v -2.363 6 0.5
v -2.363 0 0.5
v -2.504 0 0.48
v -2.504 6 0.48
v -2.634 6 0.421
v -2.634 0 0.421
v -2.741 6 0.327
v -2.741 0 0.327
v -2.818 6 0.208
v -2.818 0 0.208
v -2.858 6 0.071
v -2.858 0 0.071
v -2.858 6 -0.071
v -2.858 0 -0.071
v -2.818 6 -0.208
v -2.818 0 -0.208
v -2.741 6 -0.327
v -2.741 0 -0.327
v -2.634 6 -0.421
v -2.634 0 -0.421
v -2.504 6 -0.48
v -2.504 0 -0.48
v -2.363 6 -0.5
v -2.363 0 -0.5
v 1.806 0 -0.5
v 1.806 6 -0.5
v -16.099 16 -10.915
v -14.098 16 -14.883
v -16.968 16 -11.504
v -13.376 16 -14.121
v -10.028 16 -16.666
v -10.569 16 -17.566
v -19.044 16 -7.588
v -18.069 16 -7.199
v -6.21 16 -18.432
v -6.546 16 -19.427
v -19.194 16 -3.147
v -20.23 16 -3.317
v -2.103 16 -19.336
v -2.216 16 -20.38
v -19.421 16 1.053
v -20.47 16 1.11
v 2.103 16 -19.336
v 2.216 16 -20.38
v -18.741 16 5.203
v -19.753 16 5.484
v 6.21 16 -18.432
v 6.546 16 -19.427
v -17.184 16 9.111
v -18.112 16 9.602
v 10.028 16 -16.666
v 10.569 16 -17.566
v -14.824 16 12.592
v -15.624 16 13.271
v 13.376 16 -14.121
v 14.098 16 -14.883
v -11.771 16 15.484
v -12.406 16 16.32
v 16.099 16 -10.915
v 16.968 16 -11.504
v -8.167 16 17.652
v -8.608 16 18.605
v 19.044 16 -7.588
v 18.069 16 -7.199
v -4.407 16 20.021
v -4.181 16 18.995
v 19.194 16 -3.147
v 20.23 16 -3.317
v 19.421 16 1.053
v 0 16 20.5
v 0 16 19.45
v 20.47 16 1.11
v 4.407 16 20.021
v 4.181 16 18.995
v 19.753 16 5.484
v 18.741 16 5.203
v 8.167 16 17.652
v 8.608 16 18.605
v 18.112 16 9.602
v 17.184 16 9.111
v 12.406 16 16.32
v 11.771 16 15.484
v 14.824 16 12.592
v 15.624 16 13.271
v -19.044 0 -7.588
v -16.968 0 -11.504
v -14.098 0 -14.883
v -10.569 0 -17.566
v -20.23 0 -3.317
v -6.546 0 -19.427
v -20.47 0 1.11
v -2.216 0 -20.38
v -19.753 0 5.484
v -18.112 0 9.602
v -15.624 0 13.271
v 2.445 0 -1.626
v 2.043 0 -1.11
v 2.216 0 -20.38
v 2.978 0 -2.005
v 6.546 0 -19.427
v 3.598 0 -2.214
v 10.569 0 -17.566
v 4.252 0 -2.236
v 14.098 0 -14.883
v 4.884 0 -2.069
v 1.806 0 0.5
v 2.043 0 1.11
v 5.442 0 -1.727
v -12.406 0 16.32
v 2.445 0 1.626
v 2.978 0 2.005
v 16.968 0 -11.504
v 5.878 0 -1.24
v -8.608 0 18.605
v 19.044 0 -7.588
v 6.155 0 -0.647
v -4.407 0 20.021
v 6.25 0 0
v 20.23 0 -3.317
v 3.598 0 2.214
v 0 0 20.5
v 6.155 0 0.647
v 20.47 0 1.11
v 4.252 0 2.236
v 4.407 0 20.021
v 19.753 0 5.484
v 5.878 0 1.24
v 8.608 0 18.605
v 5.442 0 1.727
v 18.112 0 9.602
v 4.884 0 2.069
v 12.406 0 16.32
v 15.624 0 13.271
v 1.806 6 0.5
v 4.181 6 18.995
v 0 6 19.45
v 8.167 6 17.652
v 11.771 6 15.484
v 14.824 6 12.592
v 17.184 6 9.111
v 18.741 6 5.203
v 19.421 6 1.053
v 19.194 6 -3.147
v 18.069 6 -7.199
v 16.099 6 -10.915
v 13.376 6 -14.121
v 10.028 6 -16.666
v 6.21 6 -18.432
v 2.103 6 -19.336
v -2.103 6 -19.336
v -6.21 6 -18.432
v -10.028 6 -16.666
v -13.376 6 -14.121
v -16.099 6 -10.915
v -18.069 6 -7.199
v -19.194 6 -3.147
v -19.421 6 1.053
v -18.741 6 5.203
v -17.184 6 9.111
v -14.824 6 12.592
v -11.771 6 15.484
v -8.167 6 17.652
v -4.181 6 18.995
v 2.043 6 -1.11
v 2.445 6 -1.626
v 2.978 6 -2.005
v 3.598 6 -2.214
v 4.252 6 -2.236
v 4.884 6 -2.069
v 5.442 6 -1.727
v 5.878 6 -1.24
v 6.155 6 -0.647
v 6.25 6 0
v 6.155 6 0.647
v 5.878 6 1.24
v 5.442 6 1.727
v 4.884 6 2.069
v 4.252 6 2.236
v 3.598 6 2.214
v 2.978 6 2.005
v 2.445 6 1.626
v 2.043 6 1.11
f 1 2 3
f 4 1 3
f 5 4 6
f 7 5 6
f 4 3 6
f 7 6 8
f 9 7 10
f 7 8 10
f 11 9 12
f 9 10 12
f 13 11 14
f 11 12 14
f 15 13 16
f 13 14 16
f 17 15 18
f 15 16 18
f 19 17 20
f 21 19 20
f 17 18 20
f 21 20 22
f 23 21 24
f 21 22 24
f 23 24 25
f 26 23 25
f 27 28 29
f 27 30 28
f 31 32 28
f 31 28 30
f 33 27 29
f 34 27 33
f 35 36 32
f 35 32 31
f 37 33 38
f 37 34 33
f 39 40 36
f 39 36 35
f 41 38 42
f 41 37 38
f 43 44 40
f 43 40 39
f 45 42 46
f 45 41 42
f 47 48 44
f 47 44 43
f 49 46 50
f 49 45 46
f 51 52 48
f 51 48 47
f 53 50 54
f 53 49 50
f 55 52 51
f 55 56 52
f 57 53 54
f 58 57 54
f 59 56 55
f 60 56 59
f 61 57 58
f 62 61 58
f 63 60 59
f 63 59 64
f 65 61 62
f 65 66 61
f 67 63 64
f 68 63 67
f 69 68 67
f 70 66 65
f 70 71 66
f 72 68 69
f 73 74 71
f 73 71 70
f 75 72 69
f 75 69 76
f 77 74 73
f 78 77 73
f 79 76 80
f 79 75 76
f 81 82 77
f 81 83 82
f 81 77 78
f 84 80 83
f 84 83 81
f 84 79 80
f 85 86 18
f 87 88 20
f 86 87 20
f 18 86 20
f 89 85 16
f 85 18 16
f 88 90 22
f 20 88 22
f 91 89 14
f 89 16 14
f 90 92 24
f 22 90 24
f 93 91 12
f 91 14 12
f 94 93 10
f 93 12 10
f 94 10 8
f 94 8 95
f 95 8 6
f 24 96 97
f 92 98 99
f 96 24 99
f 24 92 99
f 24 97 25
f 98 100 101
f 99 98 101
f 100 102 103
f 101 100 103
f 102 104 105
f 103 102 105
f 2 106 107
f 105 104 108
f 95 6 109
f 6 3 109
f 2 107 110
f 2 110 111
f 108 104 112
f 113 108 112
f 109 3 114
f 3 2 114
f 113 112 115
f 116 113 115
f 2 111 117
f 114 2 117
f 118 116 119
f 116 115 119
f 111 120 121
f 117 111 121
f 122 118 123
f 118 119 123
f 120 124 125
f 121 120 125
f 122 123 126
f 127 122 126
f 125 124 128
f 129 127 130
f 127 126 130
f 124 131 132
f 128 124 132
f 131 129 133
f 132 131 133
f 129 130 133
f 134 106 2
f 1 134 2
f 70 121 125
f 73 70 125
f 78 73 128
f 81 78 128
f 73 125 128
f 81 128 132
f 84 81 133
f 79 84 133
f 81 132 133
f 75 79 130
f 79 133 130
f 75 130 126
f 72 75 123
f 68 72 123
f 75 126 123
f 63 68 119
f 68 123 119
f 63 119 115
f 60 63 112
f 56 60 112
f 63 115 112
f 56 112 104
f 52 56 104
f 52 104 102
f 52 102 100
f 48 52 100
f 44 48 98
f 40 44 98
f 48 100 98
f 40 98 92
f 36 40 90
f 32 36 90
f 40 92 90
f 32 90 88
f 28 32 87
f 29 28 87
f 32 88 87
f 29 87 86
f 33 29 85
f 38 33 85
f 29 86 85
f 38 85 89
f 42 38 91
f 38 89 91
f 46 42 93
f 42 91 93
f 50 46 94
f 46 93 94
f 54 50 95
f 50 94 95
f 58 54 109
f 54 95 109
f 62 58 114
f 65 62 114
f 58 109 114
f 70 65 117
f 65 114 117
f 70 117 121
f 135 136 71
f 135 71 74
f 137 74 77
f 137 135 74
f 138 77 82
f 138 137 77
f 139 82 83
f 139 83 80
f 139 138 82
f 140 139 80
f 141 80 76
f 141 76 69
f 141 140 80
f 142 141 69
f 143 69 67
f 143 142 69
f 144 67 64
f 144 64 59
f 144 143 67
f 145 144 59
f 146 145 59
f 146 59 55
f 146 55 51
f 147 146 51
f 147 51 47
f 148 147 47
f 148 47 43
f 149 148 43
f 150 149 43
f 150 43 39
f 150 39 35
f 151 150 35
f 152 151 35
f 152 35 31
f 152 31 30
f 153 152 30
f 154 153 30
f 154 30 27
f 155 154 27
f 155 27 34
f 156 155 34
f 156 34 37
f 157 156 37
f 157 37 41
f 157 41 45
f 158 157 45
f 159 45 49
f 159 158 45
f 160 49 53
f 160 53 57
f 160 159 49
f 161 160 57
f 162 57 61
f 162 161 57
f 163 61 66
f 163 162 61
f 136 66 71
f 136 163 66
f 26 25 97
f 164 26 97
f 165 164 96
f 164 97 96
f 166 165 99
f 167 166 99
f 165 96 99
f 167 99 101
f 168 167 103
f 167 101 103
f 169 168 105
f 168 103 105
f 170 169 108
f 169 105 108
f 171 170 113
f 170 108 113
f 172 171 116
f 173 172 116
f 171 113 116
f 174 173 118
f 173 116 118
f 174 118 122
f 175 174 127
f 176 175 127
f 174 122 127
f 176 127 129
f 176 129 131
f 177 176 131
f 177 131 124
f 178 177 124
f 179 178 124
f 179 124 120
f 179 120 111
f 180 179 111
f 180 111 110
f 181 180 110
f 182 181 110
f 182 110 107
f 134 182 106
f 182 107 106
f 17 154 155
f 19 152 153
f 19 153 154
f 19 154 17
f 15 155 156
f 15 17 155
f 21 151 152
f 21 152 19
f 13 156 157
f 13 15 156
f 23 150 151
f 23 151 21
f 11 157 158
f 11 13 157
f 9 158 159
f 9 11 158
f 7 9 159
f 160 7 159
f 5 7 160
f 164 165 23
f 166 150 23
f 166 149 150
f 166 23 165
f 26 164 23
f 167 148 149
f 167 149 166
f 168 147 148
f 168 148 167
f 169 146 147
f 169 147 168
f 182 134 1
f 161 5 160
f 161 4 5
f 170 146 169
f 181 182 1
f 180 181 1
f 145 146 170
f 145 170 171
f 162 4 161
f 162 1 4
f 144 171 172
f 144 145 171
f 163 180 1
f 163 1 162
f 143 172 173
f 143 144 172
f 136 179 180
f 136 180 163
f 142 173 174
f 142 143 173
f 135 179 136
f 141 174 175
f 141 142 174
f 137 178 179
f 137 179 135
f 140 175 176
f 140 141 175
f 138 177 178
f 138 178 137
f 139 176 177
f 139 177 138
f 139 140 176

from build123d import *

# Parameters (mm, degrees)
SKETCH1_R                = 19.45
BOSS_EXTRUDE1_DEPTH      = 6
BOSS_EXTRUDE2_DEPTH      = 10
BOSS_EXTRUDE2_DEPTH_BACK = 6
SKETCH2_R                = 20.5
SKETCH2_R_2              = 19.45


with BuildPart() as part:
    # Sketch1 → Boss-Extrude1 (new body)
    with BuildSketch(Plane(origin=(0, 0, 0), x_dir=(1, 0, 0), z_dir=(0, 1, 0))):
        with Locations(Location((0, 0, 0), (0, 0, 270))):
            Circle(SKETCH1_R)
        with BuildLine():
            Line((1.806258903, -0.5), (-2.363228991, -0.5))
            ThreePointArc((-2.363228991, -0.5), (-2.863228991, 0), (-2.363228991, 0.5))
            Line((-2.363228991, 0.5), (1.806258903, 0.5))
            ThreePointArc((1.806258903, 0.5), (6.25, 0), (1.806258903, -0.5))
        make_face(mode=Mode.SUBTRACT)
    extrude(amount=BOSS_EXTRUDE1_DEPTH)

    # Sketch2 → Boss-Extrude2 (add, two sides: drawn at the far end of the back side and taken through both)
    with BuildSketch(Plane(origin=(0, 6, 0), x_dir=(1, 0, 0), z_dir=(0, 1, 0)).offset(-BOSS_EXTRUDE2_DEPTH_BACK)):
        with Locations(Location((0, 0, 0), (0, 0, 270))):
            Circle(SKETCH2_R)
        with Locations(Location((0, 0, 0), (0, 0, 270))):
            Circle(SKETCH2_R_2, mode=Mode.SUBTRACT)
    extrude(amount=BOSS_EXTRUDE2_DEPTH + BOSS_EXTRUDE2_DEPTH_BACK)


solid = part.part
